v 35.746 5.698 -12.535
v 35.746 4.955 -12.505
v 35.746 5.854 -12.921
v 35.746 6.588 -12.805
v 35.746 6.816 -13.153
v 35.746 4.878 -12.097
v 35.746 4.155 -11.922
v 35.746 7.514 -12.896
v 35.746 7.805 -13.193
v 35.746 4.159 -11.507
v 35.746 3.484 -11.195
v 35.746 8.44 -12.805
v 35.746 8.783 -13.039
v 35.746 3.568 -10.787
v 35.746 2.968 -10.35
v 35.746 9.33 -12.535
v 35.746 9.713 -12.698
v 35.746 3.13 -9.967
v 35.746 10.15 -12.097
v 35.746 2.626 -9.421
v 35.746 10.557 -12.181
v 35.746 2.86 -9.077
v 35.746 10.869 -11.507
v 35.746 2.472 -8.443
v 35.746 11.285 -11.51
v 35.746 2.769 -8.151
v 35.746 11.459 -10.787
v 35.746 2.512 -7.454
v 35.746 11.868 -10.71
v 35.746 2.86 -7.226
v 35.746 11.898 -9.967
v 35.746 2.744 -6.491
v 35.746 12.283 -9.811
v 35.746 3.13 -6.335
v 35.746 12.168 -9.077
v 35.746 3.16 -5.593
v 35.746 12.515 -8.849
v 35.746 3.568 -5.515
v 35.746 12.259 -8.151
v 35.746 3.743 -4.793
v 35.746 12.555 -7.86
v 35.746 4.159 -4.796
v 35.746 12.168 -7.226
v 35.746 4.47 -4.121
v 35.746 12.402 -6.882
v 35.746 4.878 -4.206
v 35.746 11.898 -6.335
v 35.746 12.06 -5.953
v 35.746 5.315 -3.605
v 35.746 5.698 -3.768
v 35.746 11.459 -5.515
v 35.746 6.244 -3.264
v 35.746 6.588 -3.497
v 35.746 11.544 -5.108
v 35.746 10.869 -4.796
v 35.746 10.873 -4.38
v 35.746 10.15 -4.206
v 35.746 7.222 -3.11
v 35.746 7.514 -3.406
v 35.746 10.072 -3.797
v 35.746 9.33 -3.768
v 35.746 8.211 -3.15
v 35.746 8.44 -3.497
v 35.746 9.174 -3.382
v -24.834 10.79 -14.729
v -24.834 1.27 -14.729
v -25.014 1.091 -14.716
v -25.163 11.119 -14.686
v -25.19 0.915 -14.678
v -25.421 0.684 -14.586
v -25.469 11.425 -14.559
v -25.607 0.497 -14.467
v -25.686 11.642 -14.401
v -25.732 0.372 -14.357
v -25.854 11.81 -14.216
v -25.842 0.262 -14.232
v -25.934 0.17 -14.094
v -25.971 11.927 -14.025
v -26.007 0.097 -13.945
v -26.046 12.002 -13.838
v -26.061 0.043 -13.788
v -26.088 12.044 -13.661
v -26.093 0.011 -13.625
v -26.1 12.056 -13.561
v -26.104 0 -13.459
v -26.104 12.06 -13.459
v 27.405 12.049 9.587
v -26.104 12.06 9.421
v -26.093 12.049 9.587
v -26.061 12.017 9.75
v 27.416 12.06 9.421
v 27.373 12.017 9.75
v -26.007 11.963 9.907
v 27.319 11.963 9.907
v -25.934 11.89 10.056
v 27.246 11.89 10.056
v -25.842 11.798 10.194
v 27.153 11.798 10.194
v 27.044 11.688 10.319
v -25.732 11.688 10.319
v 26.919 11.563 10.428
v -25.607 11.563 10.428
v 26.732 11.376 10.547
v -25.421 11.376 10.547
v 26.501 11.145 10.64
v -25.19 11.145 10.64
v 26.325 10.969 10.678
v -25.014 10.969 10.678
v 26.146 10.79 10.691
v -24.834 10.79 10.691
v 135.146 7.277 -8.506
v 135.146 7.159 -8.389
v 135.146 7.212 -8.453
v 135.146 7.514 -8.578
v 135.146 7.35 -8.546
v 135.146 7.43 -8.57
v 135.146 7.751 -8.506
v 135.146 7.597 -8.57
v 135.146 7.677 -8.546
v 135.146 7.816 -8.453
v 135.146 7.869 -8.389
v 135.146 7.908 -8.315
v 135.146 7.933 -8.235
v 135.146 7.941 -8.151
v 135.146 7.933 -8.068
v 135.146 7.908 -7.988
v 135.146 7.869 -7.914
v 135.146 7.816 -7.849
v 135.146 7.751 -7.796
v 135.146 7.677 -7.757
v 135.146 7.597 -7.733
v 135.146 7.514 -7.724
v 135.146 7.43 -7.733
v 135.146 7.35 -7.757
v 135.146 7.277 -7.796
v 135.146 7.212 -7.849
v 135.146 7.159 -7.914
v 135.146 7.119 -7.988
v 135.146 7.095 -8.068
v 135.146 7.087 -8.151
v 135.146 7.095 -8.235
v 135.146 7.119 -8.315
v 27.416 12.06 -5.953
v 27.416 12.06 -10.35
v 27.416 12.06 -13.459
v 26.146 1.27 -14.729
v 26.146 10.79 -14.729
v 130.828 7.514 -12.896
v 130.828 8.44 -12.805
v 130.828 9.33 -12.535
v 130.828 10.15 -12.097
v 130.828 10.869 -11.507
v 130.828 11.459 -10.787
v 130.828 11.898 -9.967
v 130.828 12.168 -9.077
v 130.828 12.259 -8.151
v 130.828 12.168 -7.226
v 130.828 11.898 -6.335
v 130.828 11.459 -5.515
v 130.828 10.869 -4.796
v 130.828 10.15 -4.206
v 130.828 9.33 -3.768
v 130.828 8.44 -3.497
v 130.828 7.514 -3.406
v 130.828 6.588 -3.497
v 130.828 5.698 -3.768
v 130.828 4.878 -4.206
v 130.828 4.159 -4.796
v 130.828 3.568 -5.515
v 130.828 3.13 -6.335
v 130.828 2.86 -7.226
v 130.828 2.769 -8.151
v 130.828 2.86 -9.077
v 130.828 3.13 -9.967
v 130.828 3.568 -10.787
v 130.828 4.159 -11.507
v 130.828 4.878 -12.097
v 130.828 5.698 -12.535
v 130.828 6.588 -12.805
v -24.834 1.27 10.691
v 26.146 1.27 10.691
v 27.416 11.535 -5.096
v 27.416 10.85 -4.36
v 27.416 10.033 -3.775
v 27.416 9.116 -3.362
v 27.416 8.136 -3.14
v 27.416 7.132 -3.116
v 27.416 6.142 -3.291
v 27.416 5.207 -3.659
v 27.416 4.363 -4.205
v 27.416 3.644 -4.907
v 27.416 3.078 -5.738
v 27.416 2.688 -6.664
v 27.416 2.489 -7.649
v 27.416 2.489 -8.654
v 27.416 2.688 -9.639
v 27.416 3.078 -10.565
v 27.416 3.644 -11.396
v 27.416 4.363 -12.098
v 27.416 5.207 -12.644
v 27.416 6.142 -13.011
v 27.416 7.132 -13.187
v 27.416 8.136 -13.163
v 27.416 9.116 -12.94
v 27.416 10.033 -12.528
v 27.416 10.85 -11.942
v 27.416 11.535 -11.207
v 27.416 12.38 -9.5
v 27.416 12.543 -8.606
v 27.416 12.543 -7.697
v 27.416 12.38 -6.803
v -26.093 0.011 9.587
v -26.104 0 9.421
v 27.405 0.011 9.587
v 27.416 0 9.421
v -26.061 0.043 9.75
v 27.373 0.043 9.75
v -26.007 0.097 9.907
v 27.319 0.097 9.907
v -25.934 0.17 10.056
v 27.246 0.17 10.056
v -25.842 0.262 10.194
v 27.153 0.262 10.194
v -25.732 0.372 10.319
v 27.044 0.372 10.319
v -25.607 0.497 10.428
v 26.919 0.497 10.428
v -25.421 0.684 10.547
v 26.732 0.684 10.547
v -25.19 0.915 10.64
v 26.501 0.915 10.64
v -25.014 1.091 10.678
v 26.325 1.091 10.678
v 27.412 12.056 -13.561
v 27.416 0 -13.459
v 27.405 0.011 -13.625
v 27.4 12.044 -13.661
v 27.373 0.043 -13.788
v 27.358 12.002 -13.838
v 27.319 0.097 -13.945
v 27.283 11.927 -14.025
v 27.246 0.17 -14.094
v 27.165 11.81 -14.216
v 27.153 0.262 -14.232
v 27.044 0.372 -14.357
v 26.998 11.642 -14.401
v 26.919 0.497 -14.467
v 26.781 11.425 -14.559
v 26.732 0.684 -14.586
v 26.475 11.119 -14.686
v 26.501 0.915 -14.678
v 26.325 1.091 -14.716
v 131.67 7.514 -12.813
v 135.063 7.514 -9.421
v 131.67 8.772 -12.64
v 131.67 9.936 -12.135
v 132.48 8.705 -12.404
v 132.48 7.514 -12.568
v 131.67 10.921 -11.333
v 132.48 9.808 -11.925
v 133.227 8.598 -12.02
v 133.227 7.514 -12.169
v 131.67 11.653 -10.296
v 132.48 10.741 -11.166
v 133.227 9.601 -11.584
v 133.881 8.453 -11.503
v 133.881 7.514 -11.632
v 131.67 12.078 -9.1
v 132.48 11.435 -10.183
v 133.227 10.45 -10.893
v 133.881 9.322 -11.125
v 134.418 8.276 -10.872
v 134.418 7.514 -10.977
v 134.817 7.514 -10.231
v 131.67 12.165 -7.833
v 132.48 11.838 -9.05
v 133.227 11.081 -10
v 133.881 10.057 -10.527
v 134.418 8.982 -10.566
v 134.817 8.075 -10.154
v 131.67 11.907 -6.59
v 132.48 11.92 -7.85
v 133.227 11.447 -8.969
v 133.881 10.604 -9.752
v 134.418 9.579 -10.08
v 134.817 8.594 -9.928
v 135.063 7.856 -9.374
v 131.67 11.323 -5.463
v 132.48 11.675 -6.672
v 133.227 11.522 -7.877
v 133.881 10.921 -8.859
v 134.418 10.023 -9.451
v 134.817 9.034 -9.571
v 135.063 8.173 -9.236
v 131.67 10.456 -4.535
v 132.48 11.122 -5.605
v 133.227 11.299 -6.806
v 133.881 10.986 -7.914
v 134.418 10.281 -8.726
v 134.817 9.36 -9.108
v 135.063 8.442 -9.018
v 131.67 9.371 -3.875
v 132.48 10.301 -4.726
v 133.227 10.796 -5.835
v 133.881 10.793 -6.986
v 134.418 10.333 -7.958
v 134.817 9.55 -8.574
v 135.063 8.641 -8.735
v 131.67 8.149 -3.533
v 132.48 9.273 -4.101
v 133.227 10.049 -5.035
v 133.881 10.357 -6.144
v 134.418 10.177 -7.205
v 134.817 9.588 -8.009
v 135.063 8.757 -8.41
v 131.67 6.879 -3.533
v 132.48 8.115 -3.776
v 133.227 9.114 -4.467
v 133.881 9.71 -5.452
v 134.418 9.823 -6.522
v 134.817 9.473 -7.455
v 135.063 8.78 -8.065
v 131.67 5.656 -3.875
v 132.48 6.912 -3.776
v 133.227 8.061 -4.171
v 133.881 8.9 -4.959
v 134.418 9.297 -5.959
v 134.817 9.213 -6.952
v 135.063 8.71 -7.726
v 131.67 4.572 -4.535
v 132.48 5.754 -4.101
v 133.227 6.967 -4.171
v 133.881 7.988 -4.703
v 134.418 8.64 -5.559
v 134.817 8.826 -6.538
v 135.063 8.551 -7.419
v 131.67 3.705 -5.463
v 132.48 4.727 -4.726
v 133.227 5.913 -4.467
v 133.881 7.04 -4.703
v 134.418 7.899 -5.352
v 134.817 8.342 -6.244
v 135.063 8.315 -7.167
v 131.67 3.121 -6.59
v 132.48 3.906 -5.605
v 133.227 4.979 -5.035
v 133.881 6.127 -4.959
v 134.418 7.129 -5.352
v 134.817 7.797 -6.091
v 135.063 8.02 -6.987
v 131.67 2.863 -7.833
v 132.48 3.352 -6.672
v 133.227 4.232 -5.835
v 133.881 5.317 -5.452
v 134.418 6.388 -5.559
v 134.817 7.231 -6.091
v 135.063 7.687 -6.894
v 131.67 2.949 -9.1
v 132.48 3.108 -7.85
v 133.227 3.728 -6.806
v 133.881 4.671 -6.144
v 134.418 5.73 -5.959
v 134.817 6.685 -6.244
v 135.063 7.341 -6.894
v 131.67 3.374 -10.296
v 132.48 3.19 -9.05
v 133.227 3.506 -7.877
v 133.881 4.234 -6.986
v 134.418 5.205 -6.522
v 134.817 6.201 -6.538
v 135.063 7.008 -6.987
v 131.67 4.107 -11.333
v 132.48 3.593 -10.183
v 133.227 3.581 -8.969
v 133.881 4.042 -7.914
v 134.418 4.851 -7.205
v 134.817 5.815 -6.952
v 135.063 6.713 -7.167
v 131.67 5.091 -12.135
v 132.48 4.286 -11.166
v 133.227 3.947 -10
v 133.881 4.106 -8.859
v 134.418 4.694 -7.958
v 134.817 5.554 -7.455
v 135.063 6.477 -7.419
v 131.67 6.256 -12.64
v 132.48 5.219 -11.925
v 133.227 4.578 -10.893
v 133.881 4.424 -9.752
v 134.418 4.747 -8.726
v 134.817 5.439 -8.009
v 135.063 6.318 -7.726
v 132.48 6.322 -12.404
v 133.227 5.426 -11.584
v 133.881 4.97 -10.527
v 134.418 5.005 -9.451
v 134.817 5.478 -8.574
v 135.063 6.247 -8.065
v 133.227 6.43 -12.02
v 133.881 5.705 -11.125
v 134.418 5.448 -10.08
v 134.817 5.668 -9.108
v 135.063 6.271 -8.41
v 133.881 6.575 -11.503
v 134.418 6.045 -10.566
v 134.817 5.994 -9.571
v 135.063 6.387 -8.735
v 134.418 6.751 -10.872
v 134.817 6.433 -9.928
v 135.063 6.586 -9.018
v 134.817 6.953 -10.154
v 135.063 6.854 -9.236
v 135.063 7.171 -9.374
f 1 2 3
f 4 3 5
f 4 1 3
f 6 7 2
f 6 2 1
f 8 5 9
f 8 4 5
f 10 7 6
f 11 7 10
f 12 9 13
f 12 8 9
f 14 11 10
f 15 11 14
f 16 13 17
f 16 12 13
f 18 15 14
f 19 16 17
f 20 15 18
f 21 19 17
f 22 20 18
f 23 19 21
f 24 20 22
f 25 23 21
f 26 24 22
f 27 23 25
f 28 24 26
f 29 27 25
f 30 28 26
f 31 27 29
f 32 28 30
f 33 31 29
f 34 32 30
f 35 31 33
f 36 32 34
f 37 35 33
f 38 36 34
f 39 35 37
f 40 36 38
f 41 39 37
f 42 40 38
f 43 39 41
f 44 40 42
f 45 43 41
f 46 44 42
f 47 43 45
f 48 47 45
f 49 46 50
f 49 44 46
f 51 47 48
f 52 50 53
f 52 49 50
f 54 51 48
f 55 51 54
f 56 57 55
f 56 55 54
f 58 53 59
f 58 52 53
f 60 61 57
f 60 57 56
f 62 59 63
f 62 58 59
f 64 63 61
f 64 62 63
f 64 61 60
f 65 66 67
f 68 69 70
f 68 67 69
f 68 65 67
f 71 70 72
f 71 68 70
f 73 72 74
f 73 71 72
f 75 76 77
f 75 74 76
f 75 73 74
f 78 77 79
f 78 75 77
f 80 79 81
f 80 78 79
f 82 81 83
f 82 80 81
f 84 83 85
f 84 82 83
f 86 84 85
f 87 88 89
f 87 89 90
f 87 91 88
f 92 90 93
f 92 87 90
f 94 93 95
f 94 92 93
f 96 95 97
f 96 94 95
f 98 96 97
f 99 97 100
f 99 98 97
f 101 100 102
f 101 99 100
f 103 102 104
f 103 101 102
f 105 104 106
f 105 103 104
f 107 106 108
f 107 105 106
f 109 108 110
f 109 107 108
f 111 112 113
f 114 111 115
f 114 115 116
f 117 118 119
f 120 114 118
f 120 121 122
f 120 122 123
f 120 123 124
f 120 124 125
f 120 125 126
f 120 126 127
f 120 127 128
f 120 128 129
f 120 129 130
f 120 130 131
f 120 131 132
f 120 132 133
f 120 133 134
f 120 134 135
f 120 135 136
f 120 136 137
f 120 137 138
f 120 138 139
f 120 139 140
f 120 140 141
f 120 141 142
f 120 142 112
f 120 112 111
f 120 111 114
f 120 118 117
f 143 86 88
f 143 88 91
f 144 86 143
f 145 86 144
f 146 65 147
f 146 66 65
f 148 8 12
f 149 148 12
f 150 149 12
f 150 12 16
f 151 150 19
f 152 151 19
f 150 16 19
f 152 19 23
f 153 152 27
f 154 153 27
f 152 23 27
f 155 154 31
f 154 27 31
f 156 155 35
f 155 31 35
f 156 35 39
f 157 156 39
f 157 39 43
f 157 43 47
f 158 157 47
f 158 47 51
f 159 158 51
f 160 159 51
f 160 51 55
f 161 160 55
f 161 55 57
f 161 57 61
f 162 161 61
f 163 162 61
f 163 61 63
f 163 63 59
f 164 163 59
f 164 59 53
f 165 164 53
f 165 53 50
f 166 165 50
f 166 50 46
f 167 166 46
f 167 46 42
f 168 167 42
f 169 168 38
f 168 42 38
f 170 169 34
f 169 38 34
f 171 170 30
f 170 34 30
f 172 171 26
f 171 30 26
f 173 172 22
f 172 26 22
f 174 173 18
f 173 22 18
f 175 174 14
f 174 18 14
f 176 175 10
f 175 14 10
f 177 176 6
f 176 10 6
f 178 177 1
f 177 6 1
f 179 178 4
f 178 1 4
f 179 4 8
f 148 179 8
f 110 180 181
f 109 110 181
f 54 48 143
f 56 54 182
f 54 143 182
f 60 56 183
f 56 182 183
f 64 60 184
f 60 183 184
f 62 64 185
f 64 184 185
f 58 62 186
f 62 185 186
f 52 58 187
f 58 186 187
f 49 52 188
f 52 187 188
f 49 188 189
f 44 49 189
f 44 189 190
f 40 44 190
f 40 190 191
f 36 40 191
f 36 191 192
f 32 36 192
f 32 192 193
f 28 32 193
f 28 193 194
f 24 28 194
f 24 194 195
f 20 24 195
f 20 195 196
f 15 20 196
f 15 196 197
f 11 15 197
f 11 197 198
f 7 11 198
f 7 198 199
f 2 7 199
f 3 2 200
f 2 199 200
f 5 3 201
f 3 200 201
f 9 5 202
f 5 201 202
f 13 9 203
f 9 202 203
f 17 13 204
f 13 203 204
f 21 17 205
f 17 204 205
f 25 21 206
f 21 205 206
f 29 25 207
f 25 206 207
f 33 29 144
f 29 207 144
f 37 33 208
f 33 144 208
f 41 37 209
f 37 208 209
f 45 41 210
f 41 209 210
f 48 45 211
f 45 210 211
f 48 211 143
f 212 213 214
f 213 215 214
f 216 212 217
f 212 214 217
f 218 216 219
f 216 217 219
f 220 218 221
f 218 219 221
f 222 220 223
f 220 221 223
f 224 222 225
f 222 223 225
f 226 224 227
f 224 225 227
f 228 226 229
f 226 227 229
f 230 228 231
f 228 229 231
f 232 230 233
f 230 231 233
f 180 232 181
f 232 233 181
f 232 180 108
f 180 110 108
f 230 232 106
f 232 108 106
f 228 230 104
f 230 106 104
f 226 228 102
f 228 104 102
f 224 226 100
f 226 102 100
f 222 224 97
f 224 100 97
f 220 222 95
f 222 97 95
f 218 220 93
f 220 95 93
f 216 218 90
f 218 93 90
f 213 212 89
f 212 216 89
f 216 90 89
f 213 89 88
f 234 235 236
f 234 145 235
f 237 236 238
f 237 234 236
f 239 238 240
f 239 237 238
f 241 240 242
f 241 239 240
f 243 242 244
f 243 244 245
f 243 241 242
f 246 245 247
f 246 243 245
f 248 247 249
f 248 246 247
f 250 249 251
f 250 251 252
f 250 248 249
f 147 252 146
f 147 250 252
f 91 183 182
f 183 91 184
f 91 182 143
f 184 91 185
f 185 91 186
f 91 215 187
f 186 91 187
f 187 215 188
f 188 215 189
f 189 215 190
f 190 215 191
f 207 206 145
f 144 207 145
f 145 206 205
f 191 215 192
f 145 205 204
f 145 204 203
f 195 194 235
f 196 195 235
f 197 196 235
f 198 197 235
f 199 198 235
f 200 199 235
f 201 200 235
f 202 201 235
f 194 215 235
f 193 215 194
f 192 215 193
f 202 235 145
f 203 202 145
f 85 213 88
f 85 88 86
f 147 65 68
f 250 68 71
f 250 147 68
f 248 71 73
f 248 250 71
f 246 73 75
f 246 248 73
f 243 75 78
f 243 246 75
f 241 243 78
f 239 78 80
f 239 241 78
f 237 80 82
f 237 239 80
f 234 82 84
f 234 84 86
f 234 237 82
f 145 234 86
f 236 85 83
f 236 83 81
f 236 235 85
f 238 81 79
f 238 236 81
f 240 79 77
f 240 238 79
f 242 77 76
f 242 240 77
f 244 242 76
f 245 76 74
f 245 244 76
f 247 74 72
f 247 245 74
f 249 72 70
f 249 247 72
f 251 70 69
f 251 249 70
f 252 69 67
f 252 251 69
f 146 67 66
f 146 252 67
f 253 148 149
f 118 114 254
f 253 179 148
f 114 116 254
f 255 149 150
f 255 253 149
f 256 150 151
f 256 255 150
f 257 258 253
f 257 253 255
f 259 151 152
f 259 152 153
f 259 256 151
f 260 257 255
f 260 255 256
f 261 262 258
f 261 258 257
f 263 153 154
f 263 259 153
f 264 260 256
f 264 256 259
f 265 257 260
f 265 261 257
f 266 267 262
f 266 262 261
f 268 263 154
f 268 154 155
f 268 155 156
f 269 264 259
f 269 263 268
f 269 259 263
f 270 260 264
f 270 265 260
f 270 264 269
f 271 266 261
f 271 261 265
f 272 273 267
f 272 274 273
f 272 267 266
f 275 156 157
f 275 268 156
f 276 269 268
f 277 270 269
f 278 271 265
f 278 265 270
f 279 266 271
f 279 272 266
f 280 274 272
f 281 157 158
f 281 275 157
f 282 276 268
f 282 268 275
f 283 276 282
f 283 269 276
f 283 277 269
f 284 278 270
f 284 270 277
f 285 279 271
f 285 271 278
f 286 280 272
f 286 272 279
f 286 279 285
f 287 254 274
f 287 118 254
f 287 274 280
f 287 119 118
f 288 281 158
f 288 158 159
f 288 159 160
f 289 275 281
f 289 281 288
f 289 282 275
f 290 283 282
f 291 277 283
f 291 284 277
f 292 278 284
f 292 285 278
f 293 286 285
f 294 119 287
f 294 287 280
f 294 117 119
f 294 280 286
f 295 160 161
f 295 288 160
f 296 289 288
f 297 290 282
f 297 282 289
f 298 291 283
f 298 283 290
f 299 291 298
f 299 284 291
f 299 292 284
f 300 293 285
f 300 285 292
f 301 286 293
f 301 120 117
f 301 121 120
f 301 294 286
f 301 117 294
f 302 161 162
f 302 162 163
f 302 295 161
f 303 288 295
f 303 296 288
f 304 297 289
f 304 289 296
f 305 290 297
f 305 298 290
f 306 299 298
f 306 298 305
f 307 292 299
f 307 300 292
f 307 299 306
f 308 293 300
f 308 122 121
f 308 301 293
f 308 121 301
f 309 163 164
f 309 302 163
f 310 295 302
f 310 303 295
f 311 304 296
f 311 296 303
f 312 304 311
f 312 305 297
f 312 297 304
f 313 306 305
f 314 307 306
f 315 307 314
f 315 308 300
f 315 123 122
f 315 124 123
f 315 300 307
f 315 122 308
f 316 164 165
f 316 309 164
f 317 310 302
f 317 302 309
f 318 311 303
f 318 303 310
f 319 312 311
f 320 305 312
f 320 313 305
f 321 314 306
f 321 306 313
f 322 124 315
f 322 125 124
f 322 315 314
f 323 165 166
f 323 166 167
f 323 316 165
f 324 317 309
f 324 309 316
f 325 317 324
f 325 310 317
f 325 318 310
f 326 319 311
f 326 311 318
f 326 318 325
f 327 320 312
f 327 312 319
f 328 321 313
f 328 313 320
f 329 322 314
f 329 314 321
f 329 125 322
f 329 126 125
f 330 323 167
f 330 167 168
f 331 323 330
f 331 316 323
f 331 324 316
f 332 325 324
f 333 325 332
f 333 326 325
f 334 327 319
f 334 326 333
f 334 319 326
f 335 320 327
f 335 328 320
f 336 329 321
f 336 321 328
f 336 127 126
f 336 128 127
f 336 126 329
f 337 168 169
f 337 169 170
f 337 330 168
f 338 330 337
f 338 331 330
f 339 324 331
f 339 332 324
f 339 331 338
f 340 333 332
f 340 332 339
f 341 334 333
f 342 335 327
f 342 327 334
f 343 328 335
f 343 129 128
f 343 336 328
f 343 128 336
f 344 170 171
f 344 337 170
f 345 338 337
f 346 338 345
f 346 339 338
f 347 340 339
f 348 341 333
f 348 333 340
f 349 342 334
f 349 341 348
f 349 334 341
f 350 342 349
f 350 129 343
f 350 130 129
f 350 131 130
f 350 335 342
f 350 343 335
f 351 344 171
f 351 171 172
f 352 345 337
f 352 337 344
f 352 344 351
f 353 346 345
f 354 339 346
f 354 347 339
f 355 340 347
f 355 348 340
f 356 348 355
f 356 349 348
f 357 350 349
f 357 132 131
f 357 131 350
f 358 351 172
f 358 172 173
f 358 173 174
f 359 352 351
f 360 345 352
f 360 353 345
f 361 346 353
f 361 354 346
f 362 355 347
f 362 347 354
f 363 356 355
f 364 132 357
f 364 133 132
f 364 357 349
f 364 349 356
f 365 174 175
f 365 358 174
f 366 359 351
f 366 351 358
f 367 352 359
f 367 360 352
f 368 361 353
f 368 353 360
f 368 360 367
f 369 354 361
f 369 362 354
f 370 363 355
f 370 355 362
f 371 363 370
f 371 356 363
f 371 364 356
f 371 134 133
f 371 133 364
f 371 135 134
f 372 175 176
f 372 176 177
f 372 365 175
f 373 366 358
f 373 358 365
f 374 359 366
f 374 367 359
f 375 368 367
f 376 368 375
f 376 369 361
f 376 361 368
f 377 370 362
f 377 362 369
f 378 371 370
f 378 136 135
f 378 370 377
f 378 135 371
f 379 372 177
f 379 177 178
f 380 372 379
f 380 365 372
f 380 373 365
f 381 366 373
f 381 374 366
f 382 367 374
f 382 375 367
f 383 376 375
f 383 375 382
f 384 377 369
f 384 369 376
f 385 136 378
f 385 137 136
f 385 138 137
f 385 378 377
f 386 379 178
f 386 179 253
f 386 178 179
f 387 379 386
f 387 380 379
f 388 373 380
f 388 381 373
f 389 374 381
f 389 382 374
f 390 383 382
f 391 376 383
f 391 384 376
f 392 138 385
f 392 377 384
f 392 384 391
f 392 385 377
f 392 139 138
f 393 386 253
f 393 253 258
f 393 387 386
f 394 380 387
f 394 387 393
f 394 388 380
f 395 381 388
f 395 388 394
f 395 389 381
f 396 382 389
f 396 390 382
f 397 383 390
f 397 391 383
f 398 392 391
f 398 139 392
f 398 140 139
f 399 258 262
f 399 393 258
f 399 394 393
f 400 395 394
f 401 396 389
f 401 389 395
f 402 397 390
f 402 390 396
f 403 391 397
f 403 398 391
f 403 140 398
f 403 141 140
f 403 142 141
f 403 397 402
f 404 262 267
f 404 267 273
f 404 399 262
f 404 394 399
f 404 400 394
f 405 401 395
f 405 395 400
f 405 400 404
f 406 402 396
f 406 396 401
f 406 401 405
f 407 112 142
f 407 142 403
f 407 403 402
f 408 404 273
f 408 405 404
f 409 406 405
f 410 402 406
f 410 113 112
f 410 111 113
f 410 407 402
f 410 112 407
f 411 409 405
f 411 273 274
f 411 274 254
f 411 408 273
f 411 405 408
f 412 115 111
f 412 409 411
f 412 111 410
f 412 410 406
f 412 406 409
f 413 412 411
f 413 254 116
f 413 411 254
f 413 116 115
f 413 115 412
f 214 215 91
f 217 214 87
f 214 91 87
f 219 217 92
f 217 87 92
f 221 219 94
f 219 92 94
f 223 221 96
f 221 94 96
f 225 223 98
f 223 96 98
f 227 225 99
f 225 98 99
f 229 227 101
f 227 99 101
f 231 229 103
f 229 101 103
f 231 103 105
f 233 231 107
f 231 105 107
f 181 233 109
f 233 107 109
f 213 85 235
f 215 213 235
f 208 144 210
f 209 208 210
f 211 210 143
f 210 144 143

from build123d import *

# Parameters (mm, degrees)
SKETCH1_W           = 53.52
SKETCH1_H           = 25.42
BOSS_EXTRUDE2_DEPTH = 12.06
SKETCH2_R           = 5.05
BOSS_EXTRUDE3_DEPTH = 8.33
SKETCH3_R           = 4.745
BOSS_EXTRUDE4_DEPTH = 12
SKETCH4_R           = 4.745
BOSS_EXTRUDE5_DEPTH = 87.4
FILLET1_R           = 4.318
FILLET2_R           = 1.27
FILLET3_R           = 1.27


with BuildPart() as part:
    # Sketch1 → Boss-Extrude2 (new body)
    with BuildSketch(Plane(origin=(0, 0, 0), x_dir=(1, 0, 0), z_dir=(0, 1, 0))):
        with Locations((0.655882353, 2.019117647)):
            Rectangle(SKETCH1_W, SKETCH1_H)
    extrude(amount=BOSS_EXTRUDE2_DEPTH)

    # Sketch2 → Boss-Extrude3 (add)
    with BuildSketch(Plane(origin=(27.415882353, 0, 0), x_dir=(0, 0, -1), z_dir=(1, 0, 0))):
        with Locations(Location((8.151317647, 7.5138, 0), (0, 0, 115.810680581))):
            Circle(SKETCH2_R)
    extrude(amount=BOSS_EXTRUDE3_DEPTH)

    # Sketch3 → Boss-Extrude4 (add)
    with BuildSketch(Plane(origin=(35.745882353, 0, 0), x_dir=(0, 0, -1), z_dir=(1, 0, 0))):
        with Locations((8.151317647, 7.5138)):
            Circle(SKETCH3_R)
    extrude(amount=BOSS_EXTRUDE4_DEPTH)

    # Sketch4 → Boss-Extrude5 (add)
    with BuildSketch(Plane(origin=(47.745882353, 0, 0), x_dir=(0, 0, -1), z_dir=(1, 0, 0))):
        with Locations((8.151317647, 7.5138)):
            Circle(SKETCH4_R)
    extrude(amount=BOSS_EXTRUDE5_DEPTH)

    # Fillet1
    fillet1_edges = [part.edges().sort_by_distance(p)[0] for p in [
        (135.145882353, 7.5138, -3.406317647),
    ]]
    fillet(fillet1_edges, radius=FILLET1_R)

    # Fillet2
    fillet2_edges = [part.edges().sort_by_distance(p)[0] for p in [
        (0.655882353, 0, 10.690882353),
        (0.655882353, 12.06, 10.690882353),
        (27.415882353, 6.03, 10.690882353),
        (-26.104117647, 6.03, 10.690882353),
    ]]
    fillet(fillet2_edges, radius=FILLET2_R)

    # Fillet3
    fillet3_edges = [part.edges().sort_by_distance(p)[0] for p in [
        (0.655882353, 12.06, -14.729117647),
        (0.655882353, 0, -14.729117647),
        (-26.104117647, 6.03, -14.729117647),
        (27.415882353, 6.03, -14.729117647),
    ]]
    fillet(fillet3_edges, radius=FILLET3_R)


solid = part.part
